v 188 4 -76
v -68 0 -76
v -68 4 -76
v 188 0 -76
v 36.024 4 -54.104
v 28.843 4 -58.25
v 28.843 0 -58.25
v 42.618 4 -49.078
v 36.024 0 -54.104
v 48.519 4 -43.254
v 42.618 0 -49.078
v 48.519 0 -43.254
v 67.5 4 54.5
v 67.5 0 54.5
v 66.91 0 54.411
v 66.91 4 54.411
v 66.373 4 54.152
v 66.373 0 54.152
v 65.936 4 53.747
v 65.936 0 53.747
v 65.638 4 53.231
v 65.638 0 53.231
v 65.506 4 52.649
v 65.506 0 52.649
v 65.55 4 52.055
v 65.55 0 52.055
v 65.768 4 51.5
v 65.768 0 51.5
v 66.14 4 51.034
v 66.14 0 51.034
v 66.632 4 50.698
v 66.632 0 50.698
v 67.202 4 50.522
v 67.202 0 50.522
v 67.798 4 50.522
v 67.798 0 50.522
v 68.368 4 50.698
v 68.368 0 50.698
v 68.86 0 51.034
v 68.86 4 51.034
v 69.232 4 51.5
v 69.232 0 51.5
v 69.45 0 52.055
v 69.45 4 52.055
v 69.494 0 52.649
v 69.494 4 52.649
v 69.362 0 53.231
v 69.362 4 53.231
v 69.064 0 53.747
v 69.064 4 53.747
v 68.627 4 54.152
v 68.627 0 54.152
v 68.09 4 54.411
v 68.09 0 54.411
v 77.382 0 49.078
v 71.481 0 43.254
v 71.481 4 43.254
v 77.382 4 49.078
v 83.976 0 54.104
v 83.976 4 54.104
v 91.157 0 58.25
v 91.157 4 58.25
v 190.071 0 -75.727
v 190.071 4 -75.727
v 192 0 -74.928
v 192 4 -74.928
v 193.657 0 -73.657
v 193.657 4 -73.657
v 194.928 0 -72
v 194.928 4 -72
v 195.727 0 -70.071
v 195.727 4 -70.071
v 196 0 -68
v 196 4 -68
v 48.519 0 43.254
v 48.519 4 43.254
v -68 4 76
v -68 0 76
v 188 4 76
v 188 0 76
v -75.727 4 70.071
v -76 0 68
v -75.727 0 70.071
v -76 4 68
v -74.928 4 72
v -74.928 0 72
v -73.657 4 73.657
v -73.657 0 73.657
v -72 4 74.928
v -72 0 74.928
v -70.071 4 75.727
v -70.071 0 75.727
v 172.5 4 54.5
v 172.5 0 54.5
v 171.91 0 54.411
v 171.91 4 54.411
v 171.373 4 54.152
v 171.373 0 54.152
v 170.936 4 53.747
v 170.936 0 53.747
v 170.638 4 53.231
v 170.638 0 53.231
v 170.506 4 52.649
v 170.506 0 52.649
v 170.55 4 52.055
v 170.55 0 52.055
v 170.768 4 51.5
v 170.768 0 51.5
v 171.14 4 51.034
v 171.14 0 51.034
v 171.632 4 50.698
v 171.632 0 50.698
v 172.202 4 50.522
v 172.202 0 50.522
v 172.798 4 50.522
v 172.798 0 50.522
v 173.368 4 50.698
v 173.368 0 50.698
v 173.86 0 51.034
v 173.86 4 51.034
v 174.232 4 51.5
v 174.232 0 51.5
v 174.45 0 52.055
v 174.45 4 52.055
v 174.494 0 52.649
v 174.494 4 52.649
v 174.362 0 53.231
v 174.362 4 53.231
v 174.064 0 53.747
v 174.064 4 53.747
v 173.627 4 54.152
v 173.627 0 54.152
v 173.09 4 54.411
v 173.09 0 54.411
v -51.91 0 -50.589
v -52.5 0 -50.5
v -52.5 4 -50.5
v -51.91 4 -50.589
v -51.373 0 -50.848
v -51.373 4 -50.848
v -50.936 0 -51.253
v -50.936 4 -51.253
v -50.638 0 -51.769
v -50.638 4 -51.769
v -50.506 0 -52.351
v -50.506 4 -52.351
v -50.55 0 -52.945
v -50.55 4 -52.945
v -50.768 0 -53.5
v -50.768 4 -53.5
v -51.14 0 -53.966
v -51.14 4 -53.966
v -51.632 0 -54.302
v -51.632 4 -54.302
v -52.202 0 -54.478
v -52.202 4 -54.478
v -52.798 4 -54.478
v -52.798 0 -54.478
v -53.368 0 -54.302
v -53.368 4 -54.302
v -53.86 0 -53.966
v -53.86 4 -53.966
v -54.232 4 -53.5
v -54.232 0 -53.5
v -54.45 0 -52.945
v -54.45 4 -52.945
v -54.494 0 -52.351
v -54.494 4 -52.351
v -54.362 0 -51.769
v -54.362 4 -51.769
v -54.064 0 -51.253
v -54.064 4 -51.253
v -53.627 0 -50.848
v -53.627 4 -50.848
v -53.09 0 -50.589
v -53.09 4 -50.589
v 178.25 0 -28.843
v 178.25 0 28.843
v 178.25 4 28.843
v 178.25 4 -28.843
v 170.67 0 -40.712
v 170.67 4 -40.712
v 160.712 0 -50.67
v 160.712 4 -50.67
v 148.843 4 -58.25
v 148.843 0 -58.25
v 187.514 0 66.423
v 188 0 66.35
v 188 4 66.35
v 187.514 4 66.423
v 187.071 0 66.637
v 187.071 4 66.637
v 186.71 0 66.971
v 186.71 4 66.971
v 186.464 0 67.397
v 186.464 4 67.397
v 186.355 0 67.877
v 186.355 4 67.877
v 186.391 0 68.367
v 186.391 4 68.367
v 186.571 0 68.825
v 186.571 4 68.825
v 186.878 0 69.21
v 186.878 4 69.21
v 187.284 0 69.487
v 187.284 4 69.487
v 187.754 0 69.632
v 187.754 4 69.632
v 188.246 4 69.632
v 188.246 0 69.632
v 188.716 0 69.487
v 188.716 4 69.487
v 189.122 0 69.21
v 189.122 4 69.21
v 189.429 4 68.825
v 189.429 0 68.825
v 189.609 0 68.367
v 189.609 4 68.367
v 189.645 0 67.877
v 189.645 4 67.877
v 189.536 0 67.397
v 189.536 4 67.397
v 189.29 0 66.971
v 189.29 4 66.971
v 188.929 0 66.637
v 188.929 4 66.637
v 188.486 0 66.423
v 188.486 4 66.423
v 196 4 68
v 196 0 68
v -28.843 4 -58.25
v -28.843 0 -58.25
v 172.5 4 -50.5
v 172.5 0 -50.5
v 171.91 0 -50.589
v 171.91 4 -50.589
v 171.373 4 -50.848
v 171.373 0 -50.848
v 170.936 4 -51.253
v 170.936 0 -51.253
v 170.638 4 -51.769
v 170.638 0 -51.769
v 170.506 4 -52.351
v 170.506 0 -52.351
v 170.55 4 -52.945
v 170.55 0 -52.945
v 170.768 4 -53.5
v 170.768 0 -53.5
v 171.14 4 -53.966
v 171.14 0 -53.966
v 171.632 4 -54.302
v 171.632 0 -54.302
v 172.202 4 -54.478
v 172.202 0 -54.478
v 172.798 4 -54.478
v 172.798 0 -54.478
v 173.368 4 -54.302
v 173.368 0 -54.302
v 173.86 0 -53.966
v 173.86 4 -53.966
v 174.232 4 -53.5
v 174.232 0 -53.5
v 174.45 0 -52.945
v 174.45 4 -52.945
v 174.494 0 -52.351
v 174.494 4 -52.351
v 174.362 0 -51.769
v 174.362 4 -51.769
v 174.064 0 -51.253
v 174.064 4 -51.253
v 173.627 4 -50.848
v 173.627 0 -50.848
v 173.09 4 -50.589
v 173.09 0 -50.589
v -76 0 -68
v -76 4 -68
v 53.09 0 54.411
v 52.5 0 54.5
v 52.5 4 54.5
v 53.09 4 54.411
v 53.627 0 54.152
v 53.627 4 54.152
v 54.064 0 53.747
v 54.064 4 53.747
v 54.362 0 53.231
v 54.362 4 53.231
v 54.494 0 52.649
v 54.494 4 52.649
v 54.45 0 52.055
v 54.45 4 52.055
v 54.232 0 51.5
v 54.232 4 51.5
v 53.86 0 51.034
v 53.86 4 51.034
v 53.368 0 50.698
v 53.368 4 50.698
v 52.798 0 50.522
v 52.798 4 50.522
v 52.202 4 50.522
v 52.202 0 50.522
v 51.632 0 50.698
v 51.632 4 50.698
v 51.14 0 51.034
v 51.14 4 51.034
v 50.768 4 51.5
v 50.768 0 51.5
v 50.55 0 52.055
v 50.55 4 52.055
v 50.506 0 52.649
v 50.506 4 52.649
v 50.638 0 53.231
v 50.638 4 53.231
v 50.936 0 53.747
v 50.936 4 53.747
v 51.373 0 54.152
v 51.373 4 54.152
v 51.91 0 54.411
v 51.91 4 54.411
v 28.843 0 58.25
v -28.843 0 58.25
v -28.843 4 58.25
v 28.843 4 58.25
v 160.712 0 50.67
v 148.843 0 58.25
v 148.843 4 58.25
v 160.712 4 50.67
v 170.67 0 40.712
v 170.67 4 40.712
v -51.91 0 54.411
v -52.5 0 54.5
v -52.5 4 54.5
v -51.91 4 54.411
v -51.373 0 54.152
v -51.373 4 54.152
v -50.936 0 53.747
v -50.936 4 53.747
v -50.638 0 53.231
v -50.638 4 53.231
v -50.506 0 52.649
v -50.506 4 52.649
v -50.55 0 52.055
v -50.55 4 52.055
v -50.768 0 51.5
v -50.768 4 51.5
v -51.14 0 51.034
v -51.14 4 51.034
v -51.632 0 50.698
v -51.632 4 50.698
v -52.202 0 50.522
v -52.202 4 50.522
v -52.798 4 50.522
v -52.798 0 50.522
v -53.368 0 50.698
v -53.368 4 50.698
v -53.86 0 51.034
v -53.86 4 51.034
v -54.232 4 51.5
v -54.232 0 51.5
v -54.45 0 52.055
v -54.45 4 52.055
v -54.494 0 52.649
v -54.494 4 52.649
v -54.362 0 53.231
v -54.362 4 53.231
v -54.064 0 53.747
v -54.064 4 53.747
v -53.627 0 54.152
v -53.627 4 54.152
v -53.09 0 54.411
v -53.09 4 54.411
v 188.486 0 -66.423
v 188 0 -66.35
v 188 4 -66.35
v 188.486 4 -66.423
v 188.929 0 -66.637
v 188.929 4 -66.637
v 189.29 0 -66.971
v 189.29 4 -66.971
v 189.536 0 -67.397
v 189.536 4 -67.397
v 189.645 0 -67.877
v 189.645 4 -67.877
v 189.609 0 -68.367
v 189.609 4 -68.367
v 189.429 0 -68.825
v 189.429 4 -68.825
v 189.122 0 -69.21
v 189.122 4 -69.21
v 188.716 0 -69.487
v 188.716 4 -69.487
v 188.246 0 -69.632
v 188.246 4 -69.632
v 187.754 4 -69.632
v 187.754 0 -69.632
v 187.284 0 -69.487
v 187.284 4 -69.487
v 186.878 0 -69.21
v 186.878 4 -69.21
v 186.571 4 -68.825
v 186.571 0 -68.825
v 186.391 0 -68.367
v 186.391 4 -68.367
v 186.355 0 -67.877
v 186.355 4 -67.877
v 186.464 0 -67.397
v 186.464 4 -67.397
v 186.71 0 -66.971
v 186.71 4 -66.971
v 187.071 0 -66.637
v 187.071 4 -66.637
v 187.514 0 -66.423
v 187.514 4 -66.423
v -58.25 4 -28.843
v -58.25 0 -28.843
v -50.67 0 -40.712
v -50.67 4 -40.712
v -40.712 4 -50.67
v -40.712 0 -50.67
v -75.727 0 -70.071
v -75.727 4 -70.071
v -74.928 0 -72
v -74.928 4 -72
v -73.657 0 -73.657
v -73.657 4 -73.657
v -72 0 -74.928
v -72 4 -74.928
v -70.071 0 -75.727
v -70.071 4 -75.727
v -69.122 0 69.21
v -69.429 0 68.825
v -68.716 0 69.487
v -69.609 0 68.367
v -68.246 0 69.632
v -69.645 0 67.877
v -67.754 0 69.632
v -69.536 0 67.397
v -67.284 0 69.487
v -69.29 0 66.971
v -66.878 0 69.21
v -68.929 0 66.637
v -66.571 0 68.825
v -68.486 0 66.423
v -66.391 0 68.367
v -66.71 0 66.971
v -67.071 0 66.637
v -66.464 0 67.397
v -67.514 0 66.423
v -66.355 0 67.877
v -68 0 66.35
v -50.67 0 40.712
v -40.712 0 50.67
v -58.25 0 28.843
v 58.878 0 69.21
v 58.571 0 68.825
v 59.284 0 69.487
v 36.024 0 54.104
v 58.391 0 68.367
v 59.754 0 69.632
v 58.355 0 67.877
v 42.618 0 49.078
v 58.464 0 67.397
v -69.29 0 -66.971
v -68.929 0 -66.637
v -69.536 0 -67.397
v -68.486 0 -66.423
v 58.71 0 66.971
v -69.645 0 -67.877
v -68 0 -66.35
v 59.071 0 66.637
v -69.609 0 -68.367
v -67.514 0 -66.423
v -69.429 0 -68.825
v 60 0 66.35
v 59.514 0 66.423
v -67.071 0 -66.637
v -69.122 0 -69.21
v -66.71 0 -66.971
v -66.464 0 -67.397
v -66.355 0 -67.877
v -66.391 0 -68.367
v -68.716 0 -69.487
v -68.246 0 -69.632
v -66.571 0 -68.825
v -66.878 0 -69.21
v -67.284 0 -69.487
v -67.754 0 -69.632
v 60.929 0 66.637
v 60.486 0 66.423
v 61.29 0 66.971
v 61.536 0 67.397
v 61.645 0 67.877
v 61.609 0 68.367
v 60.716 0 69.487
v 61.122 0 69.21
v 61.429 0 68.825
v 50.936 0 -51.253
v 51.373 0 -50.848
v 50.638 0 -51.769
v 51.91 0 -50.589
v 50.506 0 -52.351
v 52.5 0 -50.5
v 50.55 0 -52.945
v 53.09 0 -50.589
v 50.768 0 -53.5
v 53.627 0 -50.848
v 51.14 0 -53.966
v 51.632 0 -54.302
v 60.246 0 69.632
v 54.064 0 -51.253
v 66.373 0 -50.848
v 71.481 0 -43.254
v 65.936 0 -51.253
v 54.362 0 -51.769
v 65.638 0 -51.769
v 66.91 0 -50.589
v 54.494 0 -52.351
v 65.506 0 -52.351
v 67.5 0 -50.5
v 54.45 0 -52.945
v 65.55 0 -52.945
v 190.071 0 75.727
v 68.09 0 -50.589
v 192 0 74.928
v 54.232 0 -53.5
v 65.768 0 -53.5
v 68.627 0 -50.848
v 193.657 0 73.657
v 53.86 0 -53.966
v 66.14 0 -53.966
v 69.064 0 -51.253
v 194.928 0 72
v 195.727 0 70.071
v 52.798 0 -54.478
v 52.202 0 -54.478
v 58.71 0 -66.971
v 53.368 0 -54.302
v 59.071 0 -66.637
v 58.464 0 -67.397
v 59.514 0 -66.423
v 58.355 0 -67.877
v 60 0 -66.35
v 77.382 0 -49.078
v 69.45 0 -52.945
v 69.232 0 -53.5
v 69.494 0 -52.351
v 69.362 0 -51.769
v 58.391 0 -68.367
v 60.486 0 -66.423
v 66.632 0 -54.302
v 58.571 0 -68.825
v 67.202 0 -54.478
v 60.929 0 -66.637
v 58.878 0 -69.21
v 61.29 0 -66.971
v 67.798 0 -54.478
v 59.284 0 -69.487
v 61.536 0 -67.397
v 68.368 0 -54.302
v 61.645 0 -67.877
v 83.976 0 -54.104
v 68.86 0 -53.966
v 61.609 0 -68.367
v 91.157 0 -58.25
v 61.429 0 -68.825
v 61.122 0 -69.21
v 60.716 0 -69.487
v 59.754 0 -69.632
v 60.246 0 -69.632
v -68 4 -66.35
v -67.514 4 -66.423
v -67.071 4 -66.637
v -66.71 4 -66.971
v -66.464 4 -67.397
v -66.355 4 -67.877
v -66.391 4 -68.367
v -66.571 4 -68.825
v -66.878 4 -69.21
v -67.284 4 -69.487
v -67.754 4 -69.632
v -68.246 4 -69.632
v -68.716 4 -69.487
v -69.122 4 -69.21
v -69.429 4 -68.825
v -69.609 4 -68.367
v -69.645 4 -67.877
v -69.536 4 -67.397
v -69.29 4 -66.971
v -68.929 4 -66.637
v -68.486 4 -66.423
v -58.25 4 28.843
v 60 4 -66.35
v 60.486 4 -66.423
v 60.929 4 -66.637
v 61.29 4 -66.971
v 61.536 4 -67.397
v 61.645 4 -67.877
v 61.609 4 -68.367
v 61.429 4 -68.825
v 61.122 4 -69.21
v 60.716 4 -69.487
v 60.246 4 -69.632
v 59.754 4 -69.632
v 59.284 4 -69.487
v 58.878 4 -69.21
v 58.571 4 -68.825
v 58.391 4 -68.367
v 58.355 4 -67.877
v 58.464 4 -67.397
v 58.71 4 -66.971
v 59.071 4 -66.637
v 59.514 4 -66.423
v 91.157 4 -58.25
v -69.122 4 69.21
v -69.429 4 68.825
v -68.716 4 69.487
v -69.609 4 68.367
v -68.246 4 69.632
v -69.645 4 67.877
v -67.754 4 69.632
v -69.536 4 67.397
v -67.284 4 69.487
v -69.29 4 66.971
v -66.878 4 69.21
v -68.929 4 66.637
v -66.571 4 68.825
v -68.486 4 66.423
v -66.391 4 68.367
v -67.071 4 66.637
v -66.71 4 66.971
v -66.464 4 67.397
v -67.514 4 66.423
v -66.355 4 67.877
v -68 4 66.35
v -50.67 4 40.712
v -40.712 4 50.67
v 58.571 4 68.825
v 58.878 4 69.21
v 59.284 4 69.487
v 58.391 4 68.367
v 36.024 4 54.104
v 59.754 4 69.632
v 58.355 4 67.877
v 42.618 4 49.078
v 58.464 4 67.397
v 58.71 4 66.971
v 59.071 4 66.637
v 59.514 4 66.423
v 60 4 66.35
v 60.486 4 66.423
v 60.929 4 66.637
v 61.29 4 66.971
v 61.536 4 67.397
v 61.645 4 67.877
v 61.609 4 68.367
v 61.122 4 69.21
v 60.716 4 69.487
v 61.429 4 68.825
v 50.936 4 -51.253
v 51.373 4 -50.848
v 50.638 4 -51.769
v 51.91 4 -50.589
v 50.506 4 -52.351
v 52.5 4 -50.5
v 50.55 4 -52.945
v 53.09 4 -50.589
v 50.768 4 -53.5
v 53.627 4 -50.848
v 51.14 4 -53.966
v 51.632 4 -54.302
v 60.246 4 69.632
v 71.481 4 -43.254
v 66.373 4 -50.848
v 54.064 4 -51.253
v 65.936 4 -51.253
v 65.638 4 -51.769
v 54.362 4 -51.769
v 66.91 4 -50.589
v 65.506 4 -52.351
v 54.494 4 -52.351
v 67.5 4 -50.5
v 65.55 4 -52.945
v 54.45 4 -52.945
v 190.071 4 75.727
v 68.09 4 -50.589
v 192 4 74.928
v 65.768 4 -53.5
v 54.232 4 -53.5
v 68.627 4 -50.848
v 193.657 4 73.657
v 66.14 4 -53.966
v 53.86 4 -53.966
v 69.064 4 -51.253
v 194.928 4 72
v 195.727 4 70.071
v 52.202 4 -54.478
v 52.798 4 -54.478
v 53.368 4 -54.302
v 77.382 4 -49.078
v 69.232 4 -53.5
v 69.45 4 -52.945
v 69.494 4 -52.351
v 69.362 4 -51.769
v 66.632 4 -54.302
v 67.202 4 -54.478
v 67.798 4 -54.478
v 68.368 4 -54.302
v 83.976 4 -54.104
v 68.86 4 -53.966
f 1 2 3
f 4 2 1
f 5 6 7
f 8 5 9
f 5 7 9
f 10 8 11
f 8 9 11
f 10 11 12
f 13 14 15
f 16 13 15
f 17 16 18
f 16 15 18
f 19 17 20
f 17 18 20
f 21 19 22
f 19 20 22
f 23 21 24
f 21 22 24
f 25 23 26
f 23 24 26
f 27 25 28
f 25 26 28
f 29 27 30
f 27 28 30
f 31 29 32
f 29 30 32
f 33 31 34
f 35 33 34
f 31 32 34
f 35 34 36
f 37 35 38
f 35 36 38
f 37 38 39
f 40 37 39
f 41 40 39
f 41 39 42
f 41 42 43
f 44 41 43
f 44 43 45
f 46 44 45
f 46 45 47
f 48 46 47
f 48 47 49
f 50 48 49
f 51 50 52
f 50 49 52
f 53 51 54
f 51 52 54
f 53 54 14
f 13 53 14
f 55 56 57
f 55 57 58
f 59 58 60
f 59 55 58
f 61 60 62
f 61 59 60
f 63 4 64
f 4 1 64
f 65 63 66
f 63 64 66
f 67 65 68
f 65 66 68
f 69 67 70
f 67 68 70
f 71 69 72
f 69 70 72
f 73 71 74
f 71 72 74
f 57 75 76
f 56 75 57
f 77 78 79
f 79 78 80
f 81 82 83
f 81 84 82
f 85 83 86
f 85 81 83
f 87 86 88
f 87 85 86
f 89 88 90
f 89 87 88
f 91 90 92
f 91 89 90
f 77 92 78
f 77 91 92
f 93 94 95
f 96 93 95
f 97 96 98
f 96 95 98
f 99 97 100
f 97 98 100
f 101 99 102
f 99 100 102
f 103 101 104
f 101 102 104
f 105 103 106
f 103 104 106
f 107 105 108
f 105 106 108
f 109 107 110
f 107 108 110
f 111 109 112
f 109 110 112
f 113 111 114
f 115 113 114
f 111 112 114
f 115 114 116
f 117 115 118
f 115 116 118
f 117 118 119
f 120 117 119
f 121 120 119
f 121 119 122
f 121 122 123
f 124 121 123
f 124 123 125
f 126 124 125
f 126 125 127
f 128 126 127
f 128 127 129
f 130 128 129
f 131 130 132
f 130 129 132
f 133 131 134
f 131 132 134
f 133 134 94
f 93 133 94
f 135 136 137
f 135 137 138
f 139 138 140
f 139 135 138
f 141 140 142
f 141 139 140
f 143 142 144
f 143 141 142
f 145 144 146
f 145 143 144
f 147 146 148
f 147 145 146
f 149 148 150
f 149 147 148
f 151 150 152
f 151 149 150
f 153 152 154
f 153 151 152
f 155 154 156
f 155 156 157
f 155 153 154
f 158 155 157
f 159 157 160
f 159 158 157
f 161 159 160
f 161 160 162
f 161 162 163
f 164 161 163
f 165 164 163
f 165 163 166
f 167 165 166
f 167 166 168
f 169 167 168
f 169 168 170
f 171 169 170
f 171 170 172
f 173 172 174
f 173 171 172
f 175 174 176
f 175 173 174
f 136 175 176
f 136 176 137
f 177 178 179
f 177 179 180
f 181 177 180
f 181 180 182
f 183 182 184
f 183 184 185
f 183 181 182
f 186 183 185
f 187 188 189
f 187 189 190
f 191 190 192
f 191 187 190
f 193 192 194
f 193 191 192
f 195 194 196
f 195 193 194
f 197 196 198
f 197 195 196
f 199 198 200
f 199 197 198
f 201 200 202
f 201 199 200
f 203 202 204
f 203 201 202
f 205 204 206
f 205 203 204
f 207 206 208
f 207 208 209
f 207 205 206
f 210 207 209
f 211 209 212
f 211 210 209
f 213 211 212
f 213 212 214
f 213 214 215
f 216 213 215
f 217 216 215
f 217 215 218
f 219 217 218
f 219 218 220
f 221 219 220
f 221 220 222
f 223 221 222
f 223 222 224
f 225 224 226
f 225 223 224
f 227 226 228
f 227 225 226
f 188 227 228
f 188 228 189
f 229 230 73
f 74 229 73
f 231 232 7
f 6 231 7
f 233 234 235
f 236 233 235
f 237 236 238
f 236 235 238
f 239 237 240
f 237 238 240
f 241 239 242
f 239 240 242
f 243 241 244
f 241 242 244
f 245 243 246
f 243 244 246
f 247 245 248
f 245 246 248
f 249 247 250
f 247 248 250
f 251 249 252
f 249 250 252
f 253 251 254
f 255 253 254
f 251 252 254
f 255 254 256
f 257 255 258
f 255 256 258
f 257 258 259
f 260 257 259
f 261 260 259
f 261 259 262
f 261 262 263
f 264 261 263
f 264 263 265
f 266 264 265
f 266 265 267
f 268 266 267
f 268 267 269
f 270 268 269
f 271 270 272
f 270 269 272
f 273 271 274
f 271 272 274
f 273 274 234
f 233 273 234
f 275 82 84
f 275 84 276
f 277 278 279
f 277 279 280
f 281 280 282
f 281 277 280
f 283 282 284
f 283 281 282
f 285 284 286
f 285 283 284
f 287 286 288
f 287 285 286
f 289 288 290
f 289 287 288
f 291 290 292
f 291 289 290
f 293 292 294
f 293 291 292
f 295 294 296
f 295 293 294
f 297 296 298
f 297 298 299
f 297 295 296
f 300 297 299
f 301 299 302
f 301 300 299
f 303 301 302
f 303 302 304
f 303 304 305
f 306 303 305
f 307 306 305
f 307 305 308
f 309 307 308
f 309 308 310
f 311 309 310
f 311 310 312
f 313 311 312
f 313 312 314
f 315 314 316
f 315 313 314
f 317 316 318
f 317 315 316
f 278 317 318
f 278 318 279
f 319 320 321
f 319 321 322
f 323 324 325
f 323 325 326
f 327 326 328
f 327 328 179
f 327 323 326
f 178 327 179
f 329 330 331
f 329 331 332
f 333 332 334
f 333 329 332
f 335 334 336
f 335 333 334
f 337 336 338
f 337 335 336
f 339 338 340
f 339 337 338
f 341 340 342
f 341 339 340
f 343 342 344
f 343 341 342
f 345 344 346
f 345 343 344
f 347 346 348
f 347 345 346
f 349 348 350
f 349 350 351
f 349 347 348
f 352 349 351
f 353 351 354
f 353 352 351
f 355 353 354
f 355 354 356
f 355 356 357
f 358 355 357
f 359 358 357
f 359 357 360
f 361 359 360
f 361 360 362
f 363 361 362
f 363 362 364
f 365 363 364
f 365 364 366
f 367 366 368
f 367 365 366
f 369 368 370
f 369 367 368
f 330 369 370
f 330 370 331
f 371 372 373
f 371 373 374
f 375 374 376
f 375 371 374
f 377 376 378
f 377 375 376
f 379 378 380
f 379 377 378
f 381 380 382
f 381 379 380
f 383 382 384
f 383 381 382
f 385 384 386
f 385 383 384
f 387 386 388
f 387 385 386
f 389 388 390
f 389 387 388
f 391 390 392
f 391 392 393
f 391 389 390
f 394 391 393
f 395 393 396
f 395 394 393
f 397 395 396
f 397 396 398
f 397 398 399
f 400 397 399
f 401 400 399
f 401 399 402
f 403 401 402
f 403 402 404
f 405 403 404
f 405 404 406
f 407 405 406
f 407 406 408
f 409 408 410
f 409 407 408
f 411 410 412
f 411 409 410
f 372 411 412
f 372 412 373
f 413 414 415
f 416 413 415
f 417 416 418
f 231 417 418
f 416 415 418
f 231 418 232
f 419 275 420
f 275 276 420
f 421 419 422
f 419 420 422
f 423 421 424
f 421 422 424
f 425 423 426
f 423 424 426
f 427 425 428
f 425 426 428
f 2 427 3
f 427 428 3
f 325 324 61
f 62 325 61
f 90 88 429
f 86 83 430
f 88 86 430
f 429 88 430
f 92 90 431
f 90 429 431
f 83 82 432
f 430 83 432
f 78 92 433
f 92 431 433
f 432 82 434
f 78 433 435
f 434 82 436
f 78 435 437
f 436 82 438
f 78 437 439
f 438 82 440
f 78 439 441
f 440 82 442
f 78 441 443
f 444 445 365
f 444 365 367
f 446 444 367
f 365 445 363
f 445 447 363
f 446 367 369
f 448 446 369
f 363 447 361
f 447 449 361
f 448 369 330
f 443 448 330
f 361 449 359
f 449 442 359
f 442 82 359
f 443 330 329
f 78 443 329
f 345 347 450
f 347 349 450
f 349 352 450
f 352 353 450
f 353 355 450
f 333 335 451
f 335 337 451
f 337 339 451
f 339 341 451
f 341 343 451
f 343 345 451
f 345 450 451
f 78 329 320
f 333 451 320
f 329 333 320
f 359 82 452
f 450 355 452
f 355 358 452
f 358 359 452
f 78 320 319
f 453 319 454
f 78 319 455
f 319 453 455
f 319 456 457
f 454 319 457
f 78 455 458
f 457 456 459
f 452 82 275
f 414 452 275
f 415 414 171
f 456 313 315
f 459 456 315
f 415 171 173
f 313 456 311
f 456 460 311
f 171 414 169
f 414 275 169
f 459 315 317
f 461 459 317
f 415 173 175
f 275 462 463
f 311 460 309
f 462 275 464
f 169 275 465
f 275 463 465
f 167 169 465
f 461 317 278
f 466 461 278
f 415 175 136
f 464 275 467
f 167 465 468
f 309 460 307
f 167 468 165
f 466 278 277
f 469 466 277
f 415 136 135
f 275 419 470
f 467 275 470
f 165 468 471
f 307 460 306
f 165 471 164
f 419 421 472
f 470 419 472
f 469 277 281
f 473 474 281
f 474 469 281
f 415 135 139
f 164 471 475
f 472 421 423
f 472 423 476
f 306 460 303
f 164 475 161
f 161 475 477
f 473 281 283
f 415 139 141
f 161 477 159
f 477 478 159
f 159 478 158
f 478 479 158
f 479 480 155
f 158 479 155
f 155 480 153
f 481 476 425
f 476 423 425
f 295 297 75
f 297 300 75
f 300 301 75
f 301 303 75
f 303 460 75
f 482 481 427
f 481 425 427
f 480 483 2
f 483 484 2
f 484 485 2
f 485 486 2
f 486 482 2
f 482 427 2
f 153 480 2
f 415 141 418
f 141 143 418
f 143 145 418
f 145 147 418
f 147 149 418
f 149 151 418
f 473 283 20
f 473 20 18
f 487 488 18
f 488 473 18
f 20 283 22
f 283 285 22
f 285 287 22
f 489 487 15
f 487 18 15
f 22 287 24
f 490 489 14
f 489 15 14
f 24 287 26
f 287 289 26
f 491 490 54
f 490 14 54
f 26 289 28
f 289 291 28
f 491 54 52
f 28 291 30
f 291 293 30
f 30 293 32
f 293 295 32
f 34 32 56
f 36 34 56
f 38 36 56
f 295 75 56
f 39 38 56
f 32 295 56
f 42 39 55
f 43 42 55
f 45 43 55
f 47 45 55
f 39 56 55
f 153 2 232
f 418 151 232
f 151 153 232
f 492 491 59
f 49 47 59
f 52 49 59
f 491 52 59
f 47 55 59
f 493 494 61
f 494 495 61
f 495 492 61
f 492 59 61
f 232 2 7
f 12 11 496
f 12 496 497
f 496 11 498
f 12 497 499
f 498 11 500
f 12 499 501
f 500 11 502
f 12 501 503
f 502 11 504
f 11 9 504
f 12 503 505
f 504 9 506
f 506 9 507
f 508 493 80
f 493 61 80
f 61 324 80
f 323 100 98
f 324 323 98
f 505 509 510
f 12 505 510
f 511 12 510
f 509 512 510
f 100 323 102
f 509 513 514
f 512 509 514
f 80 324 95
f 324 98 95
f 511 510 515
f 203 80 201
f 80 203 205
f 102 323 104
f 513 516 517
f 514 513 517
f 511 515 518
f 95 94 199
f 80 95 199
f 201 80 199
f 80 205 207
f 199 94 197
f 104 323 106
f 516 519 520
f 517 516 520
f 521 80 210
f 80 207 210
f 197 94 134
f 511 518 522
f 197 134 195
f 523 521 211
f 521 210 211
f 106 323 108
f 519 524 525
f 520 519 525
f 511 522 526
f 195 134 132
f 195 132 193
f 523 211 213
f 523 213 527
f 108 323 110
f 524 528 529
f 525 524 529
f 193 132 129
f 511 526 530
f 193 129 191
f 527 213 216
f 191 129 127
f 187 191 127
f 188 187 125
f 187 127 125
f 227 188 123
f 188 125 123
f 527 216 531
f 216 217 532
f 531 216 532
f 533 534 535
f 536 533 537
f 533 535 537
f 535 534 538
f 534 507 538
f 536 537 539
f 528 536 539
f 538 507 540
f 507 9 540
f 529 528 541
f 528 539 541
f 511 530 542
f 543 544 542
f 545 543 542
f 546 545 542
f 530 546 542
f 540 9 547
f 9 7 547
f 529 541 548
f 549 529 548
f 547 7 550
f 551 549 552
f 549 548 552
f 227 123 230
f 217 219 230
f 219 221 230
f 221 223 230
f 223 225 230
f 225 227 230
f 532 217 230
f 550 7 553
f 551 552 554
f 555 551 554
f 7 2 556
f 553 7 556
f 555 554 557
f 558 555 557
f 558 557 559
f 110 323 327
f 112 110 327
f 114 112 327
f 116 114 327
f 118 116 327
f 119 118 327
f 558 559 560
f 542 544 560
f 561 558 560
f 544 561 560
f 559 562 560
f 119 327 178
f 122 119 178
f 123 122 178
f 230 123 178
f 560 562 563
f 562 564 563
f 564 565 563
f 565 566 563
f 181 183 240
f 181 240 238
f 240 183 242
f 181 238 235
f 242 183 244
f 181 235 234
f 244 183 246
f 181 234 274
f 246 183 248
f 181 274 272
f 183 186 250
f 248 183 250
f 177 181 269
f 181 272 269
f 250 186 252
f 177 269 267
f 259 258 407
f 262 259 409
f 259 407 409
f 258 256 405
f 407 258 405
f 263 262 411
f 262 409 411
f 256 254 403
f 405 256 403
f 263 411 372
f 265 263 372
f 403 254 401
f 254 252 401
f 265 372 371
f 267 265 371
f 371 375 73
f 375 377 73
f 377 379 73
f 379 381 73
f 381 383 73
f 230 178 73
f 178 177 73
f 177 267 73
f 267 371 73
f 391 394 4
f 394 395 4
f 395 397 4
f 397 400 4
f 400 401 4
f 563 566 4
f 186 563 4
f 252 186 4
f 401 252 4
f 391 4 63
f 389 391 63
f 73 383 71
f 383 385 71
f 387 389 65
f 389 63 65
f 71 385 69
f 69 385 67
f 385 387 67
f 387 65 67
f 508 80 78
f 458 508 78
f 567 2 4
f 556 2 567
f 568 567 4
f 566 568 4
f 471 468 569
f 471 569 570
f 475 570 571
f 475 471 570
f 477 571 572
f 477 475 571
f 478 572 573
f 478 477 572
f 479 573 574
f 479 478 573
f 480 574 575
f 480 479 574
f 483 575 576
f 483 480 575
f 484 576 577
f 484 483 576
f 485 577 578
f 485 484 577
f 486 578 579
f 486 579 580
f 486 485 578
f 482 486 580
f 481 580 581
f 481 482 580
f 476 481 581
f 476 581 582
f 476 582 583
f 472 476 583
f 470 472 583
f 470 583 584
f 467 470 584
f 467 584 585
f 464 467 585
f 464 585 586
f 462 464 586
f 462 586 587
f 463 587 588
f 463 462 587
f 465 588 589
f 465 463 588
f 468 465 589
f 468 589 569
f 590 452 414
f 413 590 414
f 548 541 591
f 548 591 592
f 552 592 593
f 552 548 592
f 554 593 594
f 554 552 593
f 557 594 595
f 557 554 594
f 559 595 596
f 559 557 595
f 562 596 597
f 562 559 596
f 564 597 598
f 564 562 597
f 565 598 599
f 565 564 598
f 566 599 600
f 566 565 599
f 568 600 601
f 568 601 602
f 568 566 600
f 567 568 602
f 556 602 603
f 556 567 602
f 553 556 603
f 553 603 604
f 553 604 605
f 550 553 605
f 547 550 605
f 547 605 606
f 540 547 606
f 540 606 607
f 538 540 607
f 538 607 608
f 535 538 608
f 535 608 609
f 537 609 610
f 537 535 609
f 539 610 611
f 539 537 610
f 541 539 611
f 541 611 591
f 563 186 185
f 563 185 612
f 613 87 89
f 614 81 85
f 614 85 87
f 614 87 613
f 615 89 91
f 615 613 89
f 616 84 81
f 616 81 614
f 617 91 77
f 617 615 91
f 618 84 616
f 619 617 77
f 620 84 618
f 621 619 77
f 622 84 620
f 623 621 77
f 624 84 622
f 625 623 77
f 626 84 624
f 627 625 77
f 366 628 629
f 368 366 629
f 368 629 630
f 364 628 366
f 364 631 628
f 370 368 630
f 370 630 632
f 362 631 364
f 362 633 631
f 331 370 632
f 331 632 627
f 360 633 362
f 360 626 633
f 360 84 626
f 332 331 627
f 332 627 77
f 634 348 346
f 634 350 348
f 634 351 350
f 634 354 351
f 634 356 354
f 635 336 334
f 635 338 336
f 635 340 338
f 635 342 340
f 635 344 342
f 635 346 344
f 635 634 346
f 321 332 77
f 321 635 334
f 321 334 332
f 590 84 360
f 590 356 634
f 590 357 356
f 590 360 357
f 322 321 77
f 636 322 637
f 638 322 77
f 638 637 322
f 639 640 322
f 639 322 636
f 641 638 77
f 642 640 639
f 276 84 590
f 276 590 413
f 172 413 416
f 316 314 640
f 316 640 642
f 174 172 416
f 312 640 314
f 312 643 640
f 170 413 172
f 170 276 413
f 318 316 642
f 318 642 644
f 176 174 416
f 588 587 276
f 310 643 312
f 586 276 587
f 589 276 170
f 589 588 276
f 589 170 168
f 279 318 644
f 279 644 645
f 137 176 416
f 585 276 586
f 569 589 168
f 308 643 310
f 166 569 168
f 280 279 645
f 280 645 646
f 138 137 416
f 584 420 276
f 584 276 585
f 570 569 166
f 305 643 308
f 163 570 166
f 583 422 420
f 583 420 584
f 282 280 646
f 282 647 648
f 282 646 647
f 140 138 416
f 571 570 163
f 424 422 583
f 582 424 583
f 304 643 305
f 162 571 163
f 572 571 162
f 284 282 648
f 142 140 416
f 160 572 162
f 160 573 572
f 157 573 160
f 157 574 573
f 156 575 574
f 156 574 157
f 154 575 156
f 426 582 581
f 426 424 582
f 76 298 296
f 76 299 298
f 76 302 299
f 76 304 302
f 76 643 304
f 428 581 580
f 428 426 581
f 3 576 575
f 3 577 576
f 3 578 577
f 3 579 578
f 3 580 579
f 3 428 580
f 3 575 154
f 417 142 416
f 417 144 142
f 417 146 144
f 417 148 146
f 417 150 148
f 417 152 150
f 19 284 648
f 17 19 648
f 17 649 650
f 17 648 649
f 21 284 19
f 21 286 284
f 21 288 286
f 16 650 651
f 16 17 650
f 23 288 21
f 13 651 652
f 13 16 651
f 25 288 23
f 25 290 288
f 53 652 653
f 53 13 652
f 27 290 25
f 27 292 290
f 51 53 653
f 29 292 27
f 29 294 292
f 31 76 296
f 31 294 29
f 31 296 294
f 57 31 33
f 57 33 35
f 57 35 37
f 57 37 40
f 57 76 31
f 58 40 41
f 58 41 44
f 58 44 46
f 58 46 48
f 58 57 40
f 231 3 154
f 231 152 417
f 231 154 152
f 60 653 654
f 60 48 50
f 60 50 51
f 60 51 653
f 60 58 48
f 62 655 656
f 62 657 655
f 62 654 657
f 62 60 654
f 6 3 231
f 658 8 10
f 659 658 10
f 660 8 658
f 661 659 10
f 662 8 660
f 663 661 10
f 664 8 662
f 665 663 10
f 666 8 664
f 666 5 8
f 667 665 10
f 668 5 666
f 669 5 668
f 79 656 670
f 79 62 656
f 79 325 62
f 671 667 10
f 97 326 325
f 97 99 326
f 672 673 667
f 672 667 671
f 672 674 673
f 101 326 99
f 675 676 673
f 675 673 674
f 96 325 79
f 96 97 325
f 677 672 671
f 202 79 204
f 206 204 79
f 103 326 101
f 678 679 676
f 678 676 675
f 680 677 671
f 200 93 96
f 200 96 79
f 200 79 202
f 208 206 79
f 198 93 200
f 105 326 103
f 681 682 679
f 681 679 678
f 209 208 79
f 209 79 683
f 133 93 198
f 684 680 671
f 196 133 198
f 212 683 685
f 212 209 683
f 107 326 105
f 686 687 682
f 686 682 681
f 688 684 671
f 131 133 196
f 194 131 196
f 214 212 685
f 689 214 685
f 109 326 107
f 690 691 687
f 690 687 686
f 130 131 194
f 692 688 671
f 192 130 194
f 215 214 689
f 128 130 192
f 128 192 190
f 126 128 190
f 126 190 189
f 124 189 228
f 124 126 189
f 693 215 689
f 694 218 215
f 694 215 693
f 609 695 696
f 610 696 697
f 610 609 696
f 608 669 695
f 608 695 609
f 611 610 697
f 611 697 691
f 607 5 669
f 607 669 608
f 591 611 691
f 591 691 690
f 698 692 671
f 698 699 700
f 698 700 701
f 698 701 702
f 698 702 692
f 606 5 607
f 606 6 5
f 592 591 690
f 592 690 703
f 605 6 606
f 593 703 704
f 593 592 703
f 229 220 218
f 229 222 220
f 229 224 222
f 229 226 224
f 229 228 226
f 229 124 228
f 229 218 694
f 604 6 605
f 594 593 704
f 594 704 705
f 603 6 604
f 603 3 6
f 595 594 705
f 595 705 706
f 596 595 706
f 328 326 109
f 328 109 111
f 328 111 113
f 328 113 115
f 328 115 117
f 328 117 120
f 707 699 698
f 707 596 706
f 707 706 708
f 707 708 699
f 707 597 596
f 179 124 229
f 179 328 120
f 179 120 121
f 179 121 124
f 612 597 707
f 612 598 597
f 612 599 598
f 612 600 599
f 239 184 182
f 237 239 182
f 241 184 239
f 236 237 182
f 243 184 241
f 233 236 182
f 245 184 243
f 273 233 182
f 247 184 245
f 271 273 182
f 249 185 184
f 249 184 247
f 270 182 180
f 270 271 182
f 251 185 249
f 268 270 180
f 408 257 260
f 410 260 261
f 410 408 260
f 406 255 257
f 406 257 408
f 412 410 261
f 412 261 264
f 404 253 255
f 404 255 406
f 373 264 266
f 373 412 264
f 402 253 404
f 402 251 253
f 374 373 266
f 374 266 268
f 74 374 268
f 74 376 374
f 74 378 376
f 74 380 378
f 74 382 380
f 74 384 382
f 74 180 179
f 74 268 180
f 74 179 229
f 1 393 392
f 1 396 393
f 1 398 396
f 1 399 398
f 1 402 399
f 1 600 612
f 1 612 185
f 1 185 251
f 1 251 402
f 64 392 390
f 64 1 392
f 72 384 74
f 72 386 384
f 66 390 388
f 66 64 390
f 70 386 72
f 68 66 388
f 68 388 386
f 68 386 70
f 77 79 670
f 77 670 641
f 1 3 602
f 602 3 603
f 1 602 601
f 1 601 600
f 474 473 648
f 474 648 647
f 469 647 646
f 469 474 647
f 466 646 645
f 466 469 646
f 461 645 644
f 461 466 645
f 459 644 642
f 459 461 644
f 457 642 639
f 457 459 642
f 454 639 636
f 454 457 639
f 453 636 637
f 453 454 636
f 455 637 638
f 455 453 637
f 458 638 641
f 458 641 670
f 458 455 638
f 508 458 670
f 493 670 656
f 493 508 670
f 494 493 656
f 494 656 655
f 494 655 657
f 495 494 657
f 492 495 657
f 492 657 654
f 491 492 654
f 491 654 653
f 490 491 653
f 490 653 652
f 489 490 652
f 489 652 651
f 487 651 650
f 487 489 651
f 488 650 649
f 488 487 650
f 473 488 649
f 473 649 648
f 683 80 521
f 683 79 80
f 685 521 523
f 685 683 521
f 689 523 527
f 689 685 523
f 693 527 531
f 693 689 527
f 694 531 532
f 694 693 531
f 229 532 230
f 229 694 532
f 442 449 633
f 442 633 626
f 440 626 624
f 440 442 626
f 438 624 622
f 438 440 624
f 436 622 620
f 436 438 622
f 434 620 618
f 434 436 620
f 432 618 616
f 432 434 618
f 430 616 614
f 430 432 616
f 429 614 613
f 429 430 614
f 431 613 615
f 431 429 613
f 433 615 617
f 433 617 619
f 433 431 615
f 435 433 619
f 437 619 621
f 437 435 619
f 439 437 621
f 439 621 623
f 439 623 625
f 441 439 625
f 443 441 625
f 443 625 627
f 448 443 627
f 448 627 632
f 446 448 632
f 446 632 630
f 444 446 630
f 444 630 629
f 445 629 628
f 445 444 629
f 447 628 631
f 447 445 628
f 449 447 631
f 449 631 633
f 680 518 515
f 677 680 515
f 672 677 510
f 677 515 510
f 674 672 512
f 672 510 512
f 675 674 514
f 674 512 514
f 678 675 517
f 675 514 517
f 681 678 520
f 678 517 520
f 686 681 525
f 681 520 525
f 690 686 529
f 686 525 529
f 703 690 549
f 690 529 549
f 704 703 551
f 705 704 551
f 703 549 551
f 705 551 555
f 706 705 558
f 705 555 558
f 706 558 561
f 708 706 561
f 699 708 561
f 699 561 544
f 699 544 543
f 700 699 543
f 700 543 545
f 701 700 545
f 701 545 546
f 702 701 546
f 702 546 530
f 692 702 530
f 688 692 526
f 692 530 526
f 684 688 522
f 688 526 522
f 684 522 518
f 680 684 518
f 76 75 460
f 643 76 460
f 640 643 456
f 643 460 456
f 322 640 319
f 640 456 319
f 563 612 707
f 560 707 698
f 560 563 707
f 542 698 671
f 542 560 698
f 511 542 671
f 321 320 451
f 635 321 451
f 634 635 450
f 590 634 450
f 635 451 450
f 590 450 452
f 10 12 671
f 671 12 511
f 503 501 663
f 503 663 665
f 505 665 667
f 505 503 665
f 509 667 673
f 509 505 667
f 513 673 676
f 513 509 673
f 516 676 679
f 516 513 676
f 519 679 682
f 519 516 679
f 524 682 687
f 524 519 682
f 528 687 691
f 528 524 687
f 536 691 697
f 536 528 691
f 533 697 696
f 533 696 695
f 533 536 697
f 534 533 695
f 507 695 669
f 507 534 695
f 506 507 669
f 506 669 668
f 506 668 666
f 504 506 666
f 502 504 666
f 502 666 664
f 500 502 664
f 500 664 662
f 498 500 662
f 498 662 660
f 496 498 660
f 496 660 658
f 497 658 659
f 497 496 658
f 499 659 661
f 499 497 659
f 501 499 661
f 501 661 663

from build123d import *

# Parameters (mm, degrees)
SKETCH1_W           = 120
SKETCH1_H           = 120
SKETCH1_W_2         = 116.5
SKETCH1_H_2         = 116.5
SKETCH1_R           = 2
BOSS_EXTRUDE1_DEPTH = 4
SKETCH2_W           = 272
SKETCH2_H           = 152
SKETCH2_R           = 1.65
SKETCH2_W_2         = 240
SKETCH2_H_2         = 120
BOSS_EXTRUDE2_DEPTH = 4
FILLET1_R           = 8
SKETCH3_W           = 120
SKETCH3_H           = 86.50757595
CUT_EXTRUDE3_DEPTH  = 211.256985615


with BuildPart() as part:
    # Sketch1 → Boss-Extrude1 (new body)
    with BuildSketch(Plane(origin=(0, 0, 0), x_dir=(1, 0, 0), z_dir=(0, 1, 0))):
        Rectangle(SKETCH1_W, SKETCH1_H)
        Rectangle(SKETCH1_W_2, SKETCH1_H_2, mode=Mode.SUBTRACT)
        with BuildLine():
            Line((-58.25, -58.25), (-28.843326785, -58.25))
            ThreePointArc((-28.843326785, -58.25), (-45.961940777, -45.961940777), (-58.25, -28.843326785))
            Line((-58.25, -28.843326785), (-58.25, -58.25))
        make_face()
        with Locations(Location((-52.5, -52.5, 0), (0, 0, 270))):
            Circle(SKETCH1_R, mode=Mode.SUBTRACT)
        with BuildLine():
            Line((-58.25, 58.25), (-58.25, 28.843326785))
            ThreePointArc((-58.25, 28.843326785), (-45.961940777, 45.961940777), (-28.843326785, 58.25))
            Line((-28.843326785, 58.25), (-58.25, 58.25))
        make_face()
        with Locations(Location((-52.5, 52.5, 0), (0, 0, 270))):
            Circle(SKETCH1_R, mode=Mode.SUBTRACT)
        with BuildLine():
            ThreePointArc((28.843326785, 58.25), (45.961940777, 45.961940777), (58.25, 28.843326785))
            Line((58.25, 28.843326785), (58.25, 58.25))
            Line((58.25, 58.25), (28.843326785, 58.25))
        make_face()
        with Locations(Location((52.5, 52.5, 0), (0, 0, 270))):
            Circle(SKETCH1_R, mode=Mode.SUBTRACT)
        with BuildLine():
            Line((28.843326785, -58.25), (58.25, -58.25))
            Line((58.25, -58.25), (58.25, -28.843326785))
            ThreePointArc((58.25, -28.843326785), (45.961940777, -45.961940777), (28.843326785, -58.25))
        make_face()
        with Locations(Location((52.5, -52.5, 0), (0, 0, 270))):
            Circle(SKETCH1_R, mode=Mode.SUBTRACT)
    boss_extrude1 = extrude(amount=BOSS_EXTRUDE1_DEPTH)

    # Mirror1: Boss-Extrude1 across plane
    add(boss_extrude1.mirror(Plane(origin=(60, 4, 0), x_dir=(0, 0, 1), z_dir=(-1, 0, 0))))

    # Sketch2 → Boss-Extrude2 (add)
    with BuildSketch(Plane(origin=(0, 0, 0), x_dir=(1, 0, 0), z_dir=(0, 1, 0))):
        with Locations((60, 0)):
            Rectangle(SKETCH2_W, SKETCH2_H)
        with Locations(Location((188, 68, 0), (0, 0, 270))):
            Circle(SKETCH2_R, mode=Mode.SUBTRACT)
        with Locations(Location((60, 68, 0), (0, 0, 270))):
            Circle(SKETCH2_R, mode=Mode.SUBTRACT)
        with Locations(Location((-68, 68, 0), (0, 0, 270))):
            Circle(SKETCH2_R, mode=Mode.SUBTRACT)
        with Locations(Location((-68, -68, 0), (0, 0, 90))):
            Circle(SKETCH2_R, mode=Mode.SUBTRACT)
        with Locations(Location((60, -68, 0), (0, 0, 90))):
            Circle(SKETCH2_R, mode=Mode.SUBTRACT)
        with Locations(Location((188, -68, 0), (0, 0, 90))):
            Circle(SKETCH2_R, mode=Mode.SUBTRACT)
        with Locations((60, 0)):
            Rectangle(SKETCH2_W_2, SKETCH2_H_2, mode=Mode.SUBTRACT)
    extrude(amount=BOSS_EXTRUDE2_DEPTH)

    # Fillet1
    fillet1_edges = [part.edges().sort_by_distance(p)[0] for p in [
        (196, 2, -76),
        (-76, 2, -76),
        (-76, 2, 76),
        (196, 2, 76),
    ]]
    fillet(fillet1_edges, radius=FILLET1_R)

    # Sketch3 → Cut-Extrude3 (cut, through all)
    with BuildSketch(Plane(origin=(0, 0, 0), x_dir=(1, 0, 0), z_dir=(0, 1, 0))):
        with Locations((60, 0)):
            Rectangle(SKETCH3_W, SKETCH3_H)
    extrude(amount=CUT_EXTRUDE3_DEPTH, mode=Mode.SUBTRACT)


solid = part.part
